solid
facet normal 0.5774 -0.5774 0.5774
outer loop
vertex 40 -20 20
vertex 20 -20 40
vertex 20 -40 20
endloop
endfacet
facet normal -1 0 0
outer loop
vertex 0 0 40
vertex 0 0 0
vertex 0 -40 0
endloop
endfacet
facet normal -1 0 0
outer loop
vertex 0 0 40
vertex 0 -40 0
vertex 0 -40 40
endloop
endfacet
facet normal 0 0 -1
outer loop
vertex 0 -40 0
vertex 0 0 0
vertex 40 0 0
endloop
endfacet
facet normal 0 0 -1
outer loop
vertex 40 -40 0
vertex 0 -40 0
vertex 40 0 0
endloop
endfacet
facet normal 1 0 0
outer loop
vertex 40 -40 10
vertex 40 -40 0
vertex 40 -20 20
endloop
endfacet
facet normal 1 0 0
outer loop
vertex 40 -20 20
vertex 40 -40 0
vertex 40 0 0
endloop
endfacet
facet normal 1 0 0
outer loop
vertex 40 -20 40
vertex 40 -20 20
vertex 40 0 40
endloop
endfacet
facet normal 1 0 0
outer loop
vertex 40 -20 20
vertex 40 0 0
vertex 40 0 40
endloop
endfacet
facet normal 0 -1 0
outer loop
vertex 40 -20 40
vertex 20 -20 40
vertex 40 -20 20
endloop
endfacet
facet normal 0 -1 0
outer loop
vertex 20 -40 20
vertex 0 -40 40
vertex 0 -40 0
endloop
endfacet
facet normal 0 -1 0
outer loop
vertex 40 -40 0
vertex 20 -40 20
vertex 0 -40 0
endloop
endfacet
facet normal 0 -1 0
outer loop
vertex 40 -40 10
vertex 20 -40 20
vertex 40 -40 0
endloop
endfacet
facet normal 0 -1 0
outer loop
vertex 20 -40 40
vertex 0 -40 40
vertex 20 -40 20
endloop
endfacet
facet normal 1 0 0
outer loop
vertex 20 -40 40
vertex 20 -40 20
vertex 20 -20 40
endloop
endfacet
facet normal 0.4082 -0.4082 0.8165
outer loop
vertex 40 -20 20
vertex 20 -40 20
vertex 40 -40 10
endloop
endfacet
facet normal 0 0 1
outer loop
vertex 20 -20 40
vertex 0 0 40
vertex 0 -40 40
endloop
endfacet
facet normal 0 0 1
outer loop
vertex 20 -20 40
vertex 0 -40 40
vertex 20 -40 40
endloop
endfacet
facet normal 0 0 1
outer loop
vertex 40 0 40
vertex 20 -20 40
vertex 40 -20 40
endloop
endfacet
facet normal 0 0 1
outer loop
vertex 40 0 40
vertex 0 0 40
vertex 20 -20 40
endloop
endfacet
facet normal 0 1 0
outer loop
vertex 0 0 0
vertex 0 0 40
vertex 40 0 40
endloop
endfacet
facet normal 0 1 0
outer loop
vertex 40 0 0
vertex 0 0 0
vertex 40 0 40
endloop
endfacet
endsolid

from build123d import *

# Parameters (mm, degrees)
F0_W     = 40
F0_H     = 40
F1_DEPTH = 40
F2_W     = 20
F2_H     = 20
F3_DEPTH = 20
F7_DEPTH = 24.4958974278


with BuildPart() as f1:
    # F0 (on Front) → F1 (new body)
    with BuildSketch(Plane.XZ):
        with Locations((20, 20)):
            Rectangle(F0_W, F0_H)
    extrude(amount=F1_DEPTH)

    # F2 (on face) → F3 (cut)
    with BuildSketch(Plane.XZ.offset(40)):
        with Locations((30, 30)):
            Rectangle(F2_W, F2_H)
    extrude(amount=-F3_DEPTH, mode=Mode.SUBTRACT)

    # F6 (on 3pt) → F7 (cut, through all)
    with BuildSketch(Plane(origin=(16.6666666667, -16.6666666667, 33.3333333333), x_dir=(0.9128709292, 0.1825741858, -0.3651483717), z_dir=(-0.4082482905, 0.4082482905, -0.8164965809))):
        Polygon((3.6514837167, 26.83281573), (25.5603860169, 8.94427191), (25.5603860169, 31.304951685), align=None)
    extrude(amount=-F7_DEPTH, mode=Mode.SUBTRACT)

    # F9 (on 3pt) → F10 (join, up to the next surface of F1)
    with BuildSketch(Plane(origin=(26.6666666667, -26.6666666667, 26.6666666667), x_dir=(-0.4082482905, -0.8164965809, -0.4082482905), z_dir=(-0.5773502692, 0.5773502692, -0.5773502692))):
        Polygon((16.3299316186, 0), (-8.1649658093, 14.1421356237), (-8.1649658093, -14.1421356237), align=None)
    extrude(until=Until.NEXT)


solid = f1.part
